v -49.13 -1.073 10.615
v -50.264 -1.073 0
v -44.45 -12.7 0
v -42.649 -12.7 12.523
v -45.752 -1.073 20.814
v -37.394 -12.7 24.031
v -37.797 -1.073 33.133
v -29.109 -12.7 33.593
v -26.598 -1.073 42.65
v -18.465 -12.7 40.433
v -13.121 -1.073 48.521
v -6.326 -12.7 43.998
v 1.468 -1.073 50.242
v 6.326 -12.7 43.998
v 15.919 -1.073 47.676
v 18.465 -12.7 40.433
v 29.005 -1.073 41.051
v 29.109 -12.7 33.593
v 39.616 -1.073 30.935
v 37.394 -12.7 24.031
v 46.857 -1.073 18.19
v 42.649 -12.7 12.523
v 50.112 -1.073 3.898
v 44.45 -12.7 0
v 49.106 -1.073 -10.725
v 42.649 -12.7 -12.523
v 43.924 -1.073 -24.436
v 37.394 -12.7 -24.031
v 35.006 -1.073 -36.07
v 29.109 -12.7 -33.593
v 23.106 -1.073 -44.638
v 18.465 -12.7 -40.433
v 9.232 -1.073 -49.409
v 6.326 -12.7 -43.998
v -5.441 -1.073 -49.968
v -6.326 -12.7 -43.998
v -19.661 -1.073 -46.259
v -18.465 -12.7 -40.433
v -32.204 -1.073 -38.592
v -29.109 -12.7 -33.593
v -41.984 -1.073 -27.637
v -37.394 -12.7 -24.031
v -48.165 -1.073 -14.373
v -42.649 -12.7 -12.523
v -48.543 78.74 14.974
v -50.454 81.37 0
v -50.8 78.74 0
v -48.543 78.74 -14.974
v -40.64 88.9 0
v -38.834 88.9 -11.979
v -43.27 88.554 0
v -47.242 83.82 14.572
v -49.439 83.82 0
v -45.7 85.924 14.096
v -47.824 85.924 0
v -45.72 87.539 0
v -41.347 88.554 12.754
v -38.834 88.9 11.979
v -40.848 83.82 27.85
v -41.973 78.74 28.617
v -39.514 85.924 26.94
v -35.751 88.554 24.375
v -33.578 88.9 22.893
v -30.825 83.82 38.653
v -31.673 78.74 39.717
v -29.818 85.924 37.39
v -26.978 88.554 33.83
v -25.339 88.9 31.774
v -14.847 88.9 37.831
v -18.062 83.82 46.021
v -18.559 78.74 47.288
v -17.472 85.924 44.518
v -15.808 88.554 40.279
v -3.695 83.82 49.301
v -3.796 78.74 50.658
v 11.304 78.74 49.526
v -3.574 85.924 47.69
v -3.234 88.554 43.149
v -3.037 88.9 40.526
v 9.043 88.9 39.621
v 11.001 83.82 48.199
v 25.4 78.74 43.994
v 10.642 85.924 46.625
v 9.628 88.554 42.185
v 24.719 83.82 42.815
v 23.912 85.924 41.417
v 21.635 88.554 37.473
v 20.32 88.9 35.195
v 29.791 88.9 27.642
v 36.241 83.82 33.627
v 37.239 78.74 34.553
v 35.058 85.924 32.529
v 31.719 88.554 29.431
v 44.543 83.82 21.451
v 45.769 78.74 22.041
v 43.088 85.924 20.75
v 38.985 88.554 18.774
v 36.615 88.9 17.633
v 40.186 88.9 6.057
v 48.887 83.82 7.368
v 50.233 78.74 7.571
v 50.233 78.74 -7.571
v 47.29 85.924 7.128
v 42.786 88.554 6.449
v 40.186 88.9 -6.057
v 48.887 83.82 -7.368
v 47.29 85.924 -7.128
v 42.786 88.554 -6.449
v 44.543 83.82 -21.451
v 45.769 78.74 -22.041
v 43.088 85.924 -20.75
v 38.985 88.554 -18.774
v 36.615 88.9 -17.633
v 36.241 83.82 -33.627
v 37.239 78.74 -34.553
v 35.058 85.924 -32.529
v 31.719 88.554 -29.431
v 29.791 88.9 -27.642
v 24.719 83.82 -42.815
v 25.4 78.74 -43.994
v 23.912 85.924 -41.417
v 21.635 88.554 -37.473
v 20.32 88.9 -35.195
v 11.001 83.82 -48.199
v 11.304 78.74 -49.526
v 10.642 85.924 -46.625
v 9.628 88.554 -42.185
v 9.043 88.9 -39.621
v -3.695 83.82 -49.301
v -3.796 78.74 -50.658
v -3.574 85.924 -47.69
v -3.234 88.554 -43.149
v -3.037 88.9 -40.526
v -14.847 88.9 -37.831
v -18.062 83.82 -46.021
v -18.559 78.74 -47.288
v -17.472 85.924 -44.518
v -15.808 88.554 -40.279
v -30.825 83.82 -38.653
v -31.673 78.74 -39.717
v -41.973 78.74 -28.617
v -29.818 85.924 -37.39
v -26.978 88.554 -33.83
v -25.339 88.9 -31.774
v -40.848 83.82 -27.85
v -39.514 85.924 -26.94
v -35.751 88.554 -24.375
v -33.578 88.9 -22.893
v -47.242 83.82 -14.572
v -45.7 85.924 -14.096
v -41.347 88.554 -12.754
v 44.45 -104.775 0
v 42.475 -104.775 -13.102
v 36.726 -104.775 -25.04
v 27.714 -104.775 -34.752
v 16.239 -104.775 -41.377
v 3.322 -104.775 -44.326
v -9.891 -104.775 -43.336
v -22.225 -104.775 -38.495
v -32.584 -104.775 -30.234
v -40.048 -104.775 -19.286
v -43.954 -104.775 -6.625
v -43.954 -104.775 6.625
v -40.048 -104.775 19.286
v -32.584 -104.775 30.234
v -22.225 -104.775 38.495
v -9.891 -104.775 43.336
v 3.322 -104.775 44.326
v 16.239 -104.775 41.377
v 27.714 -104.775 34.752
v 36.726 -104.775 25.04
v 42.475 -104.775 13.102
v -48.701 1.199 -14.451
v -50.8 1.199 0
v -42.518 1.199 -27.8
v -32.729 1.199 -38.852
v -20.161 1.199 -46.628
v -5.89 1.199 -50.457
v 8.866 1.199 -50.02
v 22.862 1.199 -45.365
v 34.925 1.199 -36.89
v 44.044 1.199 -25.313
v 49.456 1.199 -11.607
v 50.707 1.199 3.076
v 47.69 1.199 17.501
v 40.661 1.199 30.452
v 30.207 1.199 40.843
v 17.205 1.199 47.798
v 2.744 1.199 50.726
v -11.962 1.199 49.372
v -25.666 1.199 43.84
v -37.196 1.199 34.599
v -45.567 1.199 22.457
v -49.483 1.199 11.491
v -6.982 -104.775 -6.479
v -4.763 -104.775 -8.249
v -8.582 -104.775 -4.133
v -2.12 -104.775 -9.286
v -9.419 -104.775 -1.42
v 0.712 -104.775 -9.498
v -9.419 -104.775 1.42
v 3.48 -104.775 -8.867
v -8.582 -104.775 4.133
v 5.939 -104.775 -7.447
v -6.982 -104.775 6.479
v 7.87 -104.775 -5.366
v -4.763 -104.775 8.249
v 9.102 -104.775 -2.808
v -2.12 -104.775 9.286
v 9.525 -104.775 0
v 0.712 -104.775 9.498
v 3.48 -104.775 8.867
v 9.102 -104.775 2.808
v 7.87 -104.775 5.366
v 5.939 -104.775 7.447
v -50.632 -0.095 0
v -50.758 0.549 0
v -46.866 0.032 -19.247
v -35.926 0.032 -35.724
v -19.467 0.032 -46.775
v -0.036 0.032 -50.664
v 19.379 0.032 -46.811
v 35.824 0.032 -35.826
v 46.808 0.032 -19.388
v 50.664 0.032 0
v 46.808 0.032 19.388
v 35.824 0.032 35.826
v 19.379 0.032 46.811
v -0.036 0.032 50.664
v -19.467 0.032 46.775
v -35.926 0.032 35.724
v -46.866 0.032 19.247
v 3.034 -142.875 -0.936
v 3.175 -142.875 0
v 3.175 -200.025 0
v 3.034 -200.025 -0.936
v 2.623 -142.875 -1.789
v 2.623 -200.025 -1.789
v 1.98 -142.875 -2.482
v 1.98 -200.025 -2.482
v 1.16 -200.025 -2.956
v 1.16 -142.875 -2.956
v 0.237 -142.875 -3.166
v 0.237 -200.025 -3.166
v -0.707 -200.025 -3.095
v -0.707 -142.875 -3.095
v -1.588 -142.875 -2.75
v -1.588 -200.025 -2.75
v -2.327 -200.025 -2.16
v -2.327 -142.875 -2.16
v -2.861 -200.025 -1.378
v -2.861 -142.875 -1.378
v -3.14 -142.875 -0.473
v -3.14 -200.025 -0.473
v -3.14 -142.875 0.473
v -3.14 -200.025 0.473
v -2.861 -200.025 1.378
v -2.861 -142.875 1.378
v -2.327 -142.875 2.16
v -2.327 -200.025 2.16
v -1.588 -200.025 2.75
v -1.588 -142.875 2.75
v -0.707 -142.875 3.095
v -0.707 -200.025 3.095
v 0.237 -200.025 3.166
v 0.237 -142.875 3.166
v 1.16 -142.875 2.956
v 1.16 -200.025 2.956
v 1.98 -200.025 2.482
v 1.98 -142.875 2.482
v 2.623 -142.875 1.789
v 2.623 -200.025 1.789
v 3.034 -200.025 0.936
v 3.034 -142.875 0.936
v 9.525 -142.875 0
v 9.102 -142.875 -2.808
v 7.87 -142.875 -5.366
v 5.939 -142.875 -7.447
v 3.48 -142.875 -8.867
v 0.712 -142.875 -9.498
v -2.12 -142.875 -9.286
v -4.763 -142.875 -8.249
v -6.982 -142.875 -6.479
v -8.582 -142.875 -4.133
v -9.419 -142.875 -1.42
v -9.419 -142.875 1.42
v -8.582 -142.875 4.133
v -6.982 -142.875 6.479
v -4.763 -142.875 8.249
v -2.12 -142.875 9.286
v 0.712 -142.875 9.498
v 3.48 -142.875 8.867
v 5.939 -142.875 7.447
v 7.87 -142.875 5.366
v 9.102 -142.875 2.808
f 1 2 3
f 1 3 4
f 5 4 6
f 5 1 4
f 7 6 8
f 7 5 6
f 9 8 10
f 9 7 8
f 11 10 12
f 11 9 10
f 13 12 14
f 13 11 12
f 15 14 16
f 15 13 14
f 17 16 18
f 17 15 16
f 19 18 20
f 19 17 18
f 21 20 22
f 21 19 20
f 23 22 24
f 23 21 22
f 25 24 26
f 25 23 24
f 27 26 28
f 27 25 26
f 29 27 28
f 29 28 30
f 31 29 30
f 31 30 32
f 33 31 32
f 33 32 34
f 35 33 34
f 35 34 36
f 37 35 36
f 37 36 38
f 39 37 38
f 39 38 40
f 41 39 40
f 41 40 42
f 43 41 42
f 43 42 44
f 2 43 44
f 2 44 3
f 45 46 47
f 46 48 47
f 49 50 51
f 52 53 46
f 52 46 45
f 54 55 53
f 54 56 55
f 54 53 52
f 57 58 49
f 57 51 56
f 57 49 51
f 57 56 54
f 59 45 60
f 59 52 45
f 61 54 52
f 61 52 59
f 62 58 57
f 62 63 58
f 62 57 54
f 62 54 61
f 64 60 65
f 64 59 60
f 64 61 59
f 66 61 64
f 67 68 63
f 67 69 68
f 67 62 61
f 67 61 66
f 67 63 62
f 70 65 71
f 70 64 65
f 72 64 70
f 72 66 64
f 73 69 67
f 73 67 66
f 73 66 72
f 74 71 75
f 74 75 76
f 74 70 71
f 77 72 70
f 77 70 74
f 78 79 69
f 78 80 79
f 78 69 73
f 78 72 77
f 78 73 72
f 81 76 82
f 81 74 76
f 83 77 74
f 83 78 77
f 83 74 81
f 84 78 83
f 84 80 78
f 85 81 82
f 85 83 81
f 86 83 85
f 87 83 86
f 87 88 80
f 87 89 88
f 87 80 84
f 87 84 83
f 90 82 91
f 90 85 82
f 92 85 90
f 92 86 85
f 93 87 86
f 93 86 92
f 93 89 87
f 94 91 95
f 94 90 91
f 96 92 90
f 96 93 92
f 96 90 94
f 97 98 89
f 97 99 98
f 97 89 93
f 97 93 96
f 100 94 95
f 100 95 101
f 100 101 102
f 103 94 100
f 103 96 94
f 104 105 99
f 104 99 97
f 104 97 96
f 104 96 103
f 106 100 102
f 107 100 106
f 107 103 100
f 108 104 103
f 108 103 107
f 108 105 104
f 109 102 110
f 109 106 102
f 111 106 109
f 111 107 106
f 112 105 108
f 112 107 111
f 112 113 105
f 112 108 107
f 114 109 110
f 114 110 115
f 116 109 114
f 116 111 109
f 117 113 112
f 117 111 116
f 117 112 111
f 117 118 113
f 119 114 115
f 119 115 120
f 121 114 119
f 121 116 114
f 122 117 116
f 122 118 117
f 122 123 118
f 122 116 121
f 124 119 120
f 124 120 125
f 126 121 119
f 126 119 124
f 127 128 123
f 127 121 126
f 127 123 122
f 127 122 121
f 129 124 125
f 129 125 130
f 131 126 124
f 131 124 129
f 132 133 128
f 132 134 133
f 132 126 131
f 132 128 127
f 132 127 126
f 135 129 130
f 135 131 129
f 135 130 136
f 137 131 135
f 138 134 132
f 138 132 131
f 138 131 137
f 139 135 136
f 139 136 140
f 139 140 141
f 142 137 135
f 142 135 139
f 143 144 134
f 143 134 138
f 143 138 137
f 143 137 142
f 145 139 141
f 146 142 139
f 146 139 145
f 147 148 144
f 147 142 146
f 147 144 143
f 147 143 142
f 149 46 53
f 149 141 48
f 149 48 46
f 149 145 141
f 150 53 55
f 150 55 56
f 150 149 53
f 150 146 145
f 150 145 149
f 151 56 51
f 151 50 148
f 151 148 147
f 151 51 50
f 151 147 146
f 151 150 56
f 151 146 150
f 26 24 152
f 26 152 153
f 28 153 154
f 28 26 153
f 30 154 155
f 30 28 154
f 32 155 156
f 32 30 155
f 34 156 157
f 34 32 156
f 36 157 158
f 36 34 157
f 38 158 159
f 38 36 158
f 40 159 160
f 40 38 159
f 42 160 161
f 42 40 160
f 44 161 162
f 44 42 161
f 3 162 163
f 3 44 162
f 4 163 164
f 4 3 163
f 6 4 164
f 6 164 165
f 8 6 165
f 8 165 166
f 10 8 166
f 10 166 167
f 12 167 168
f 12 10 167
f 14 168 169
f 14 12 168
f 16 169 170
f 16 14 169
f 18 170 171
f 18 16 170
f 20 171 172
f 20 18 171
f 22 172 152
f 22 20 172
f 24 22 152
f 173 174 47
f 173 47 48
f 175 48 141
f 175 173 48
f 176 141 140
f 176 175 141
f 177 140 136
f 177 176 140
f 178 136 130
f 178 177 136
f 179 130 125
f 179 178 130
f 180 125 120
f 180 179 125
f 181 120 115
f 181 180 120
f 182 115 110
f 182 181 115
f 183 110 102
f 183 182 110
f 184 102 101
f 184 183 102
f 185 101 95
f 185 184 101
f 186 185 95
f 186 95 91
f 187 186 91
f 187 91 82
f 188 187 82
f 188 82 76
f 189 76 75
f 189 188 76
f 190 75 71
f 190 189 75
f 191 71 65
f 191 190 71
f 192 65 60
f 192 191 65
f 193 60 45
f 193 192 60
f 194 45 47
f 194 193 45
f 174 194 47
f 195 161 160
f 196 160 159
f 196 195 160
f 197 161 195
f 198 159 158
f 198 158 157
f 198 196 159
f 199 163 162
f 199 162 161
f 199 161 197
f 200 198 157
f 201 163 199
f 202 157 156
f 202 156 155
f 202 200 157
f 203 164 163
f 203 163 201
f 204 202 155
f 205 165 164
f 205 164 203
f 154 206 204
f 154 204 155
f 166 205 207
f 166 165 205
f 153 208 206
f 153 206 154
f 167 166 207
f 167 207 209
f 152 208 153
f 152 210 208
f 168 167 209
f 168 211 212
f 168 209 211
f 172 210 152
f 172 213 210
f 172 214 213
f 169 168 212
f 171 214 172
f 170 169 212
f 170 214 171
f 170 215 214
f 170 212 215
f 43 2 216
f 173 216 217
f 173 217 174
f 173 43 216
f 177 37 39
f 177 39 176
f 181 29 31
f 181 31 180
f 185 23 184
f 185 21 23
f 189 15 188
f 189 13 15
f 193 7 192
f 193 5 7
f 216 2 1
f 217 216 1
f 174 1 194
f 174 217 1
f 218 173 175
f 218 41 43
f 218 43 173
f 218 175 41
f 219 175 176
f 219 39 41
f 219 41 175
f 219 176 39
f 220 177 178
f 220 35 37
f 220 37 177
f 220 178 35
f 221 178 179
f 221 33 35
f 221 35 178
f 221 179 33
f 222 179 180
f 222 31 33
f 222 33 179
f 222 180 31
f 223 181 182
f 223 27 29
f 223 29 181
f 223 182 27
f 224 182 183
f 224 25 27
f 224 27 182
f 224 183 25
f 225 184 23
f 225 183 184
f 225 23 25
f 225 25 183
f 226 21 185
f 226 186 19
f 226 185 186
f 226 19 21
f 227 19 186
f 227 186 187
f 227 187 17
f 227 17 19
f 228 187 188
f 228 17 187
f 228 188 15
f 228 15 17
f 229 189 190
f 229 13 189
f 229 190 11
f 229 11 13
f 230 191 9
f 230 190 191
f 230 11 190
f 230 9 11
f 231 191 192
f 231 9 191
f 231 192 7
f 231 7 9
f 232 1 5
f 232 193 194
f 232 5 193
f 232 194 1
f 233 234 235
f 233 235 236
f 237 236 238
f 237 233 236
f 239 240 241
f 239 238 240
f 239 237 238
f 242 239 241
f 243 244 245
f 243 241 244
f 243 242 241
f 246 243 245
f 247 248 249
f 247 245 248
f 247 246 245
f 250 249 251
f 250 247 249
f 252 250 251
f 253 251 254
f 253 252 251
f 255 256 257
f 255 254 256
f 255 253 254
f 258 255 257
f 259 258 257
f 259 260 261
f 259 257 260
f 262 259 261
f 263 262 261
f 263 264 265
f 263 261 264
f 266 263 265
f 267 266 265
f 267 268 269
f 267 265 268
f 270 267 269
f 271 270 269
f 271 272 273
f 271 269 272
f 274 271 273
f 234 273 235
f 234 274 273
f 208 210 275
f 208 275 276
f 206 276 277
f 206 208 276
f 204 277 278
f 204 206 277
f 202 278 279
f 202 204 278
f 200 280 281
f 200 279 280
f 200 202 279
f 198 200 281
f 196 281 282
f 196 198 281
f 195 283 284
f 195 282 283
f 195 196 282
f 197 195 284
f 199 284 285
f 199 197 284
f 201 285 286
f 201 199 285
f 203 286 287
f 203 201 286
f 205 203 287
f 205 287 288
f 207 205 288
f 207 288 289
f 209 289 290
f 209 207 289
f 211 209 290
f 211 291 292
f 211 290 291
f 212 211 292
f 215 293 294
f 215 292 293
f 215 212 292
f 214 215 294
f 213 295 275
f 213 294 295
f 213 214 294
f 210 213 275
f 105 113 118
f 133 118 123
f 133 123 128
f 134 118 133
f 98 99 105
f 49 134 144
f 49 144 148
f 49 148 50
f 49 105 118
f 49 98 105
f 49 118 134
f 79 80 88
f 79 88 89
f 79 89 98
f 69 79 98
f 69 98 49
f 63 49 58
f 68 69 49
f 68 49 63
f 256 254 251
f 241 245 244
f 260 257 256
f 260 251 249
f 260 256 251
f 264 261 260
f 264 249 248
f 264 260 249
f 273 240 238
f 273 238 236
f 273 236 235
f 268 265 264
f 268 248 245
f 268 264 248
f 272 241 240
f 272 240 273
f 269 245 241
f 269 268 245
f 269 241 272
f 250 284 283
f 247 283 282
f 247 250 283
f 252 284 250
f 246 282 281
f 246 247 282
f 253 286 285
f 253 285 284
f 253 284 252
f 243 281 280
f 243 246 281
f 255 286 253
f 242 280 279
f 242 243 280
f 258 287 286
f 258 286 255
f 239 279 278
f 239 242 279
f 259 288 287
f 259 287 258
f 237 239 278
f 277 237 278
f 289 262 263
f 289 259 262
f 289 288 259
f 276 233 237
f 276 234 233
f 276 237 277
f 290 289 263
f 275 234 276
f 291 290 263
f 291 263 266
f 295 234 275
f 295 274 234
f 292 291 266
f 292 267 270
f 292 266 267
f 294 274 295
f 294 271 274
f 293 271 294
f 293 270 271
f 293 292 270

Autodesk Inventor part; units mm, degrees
ref_plane "YZ Plane" through (0, 0, 0) normal (1, 0, 0) x (0, 1, 0)
ref_plane "XZ Plane" through (0, 0, 0) normal (0, 1, 0) x (-1, 0, 0)
ref_plane "XY Plane" through (0, 0, 0) normal (0, 0, 1) x (1, 0, 0)
sketch "Sketch1" plane through (0, 0, 0) normal (0, 1, 0) x (-1, 0, 0)
  circle A0 centre (0, 0) radius 50.8
  dimension "d0" = 101.6
extrude "Extrusion1" add sketch "Sketch1" along normal blind 88.9
fillet "Fillet1" radius 10.16 1 edges at (50.8, 88.9, 0)
sketch "Sketch2" plane through (0, 0, 0) normal (0, -1, 0) x (1, 0, 0)
  circle A0 centre (0, 0) radius 50.8 projected
  circle A1 centre (0, 0) radius 44.45
  dimension "d4" = 88.9
extrude "Extrusion2" add sketch "Sketch2" along normal blind 12.7 contours A1
loft "Loft1" add section 1 edges at (50.8, 0, 0) section 2 edges at (-44.45, -12.7, 0)
fillet "Fillet2" radius 5.08 1 edges at (50.8, 0, 0)
sketch "Sketch3" plane through (0, -12.7, 0) normal (0, -1, 0) x (1, 0, 0)
  circle A0 centre (0, 0) radius 44.45 projected
extrude "Extrusion3" add sketch "Sketch3" along normal blind 92.075
sketch "Sketch4" plane through (0, -104.775, 0) normal (0, -1, 0) x (1, 0, 0)
  circle A0 centre (0, 0) radius 44.45 projected
  circle A1 centre (0, 0) radius 9.525
  dimension "d14" = 19.05
extrude "Extrusion4" add sketch "Sketch4" along normal blind 38.1 contours A1
sketch "Sketch5" plane through (0, -142.875, 0) normal (0, -1, 0) x (1, 0, 0)
  circle A0 centre (0, 0) radius 9.525 projected
  circle A1 centre (0, 0) radius 3.175
  dimension "d17" = 6.35
extrude "Extrusion5" add sketch "Sketch5" along normal blind 57.15 contours A1
properties part number "1617evs"
